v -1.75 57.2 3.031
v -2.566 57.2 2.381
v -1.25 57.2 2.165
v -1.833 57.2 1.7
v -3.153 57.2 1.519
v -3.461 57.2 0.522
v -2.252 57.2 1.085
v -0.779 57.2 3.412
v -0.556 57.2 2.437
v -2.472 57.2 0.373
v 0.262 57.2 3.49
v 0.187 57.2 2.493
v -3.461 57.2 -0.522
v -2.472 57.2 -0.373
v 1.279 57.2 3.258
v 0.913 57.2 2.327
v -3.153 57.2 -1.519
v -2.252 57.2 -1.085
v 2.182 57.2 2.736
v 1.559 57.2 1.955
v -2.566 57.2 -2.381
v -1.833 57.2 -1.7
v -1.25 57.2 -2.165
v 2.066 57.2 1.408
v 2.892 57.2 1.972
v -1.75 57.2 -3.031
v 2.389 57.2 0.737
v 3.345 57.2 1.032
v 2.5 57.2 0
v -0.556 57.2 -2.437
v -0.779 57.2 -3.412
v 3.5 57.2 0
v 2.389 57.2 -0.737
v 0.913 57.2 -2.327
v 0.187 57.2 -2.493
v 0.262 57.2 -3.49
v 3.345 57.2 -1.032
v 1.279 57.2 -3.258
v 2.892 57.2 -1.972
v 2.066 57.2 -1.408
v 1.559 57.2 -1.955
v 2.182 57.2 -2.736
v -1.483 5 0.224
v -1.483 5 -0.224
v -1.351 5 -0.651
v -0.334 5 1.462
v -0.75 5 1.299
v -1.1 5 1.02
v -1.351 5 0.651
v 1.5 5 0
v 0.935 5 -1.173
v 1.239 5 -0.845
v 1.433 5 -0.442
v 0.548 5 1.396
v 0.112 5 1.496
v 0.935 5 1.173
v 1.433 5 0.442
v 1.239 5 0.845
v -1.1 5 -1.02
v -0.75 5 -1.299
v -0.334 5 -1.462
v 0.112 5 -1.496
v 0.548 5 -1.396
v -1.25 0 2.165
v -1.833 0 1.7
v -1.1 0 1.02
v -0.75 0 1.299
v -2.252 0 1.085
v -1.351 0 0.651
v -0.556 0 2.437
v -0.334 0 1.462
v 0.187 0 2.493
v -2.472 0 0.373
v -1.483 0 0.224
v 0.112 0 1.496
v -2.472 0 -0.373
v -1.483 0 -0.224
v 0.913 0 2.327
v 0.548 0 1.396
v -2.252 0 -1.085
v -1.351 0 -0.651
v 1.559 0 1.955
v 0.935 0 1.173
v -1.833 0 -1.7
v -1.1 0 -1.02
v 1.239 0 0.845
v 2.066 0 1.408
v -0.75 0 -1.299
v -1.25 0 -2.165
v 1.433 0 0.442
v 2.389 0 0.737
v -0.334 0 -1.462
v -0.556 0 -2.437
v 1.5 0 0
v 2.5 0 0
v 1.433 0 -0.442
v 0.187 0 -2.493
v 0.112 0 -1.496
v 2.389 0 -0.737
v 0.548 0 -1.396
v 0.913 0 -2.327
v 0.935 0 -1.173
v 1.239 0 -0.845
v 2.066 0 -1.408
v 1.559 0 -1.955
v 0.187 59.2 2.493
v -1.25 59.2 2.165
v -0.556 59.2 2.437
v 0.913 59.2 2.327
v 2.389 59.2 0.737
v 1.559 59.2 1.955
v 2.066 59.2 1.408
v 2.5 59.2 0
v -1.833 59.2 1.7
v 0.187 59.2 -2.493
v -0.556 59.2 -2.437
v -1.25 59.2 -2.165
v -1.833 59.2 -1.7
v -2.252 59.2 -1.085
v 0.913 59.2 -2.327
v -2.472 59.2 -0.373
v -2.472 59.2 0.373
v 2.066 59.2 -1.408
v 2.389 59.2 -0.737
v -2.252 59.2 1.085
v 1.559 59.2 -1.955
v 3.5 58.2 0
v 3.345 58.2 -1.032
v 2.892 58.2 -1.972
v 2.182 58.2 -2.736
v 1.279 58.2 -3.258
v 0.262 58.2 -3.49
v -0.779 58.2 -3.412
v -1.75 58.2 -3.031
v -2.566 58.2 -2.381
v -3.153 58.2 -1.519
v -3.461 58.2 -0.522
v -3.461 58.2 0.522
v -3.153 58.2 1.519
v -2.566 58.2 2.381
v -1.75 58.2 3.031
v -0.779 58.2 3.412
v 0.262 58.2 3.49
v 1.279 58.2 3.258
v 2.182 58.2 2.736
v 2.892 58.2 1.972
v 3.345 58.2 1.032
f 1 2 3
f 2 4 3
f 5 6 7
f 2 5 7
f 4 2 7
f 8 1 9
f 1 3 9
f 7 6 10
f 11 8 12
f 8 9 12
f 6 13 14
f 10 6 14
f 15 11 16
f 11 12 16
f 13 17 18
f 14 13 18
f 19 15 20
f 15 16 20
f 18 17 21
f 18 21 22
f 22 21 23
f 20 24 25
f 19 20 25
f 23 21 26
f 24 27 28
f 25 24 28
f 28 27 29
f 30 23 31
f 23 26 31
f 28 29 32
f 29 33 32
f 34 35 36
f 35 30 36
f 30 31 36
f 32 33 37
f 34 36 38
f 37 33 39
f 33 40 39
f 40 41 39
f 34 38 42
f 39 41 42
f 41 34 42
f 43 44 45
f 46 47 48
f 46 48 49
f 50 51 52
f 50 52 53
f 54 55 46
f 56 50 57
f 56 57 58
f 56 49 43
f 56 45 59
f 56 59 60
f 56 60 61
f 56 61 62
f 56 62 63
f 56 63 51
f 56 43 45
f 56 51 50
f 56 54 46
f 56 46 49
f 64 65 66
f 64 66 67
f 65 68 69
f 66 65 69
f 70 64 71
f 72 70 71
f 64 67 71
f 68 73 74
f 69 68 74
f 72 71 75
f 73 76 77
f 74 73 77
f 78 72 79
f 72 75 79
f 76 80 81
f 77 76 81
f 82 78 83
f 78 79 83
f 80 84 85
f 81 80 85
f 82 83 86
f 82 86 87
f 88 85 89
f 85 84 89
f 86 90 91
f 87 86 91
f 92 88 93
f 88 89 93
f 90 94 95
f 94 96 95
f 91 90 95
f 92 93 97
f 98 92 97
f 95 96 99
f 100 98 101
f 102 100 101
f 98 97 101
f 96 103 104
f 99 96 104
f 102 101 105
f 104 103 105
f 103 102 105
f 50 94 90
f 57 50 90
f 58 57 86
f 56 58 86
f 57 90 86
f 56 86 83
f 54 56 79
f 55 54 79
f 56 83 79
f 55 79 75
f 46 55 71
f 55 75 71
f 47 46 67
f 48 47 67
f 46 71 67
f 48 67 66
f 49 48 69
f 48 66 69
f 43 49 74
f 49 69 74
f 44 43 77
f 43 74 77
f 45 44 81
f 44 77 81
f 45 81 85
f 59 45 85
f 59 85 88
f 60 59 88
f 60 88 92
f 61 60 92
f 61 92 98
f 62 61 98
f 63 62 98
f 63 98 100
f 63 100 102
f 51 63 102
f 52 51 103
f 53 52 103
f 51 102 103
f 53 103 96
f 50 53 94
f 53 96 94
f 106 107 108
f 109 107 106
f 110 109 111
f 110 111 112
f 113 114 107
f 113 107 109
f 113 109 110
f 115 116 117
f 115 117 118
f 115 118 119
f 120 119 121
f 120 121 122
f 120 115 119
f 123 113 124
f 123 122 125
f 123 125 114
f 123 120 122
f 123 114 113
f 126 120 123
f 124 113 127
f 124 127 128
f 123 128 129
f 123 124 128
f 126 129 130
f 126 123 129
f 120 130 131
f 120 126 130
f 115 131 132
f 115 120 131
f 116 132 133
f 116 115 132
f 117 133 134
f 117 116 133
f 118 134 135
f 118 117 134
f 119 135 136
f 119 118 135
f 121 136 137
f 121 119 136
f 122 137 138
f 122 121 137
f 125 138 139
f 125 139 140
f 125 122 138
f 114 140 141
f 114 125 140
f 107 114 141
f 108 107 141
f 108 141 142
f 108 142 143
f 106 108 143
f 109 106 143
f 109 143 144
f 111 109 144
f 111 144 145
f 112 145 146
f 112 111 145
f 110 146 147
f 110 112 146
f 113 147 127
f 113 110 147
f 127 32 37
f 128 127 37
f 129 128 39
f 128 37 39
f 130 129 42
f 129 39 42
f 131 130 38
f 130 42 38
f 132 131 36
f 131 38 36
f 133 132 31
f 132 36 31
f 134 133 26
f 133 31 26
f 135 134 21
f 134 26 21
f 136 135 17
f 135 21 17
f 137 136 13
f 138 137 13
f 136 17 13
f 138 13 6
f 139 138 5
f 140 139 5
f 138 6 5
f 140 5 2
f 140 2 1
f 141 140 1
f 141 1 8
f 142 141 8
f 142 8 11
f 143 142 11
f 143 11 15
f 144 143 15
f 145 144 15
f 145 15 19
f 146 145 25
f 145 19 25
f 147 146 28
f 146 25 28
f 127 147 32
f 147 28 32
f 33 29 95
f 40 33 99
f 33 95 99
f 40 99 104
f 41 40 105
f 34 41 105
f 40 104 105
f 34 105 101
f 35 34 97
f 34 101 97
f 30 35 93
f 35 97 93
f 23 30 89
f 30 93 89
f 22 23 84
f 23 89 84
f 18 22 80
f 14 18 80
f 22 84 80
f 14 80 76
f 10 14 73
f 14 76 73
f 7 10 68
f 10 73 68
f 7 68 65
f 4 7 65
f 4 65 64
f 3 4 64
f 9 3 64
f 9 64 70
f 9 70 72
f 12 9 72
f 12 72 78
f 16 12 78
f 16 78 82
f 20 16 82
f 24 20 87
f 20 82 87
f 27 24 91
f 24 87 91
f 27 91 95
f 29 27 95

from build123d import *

# Parameters (mm, degrees)
SKETCH1_R           = 2.5
BOSS_EXTRUDE1_DEPTH = 57.2
SKETCH2_R           = 3.5
BOSS_EXTRUDE2_DEPTH = 2
CHAMFER1_SIZE       = 1
SKETCH3_R           = 1.5
CUT_EXTRUDE1_DEPTH  = 5


with BuildPart() as part:
    # Sketch1 → Boss-Extrude1 (new body)
    with BuildSketch(Plane(origin=(0, 0, 0), x_dir=(1, 0, 0), z_dir=(0, 1, 0))):
        Circle(SKETCH1_R)
    extrude(amount=BOSS_EXTRUDE1_DEPTH)

    # Sketch2 → Boss-Extrude2 (add)
    with BuildSketch(Plane(origin=(0, 57.2, 0), x_dir=(1, 0, 0), z_dir=(0, 1, 0))):
        Circle(SKETCH2_R)
    extrude(amount=BOSS_EXTRUDE2_DEPTH)

    # Chamfer1
    chamfer1_edges = [part.edges().sort_by_distance(p)[0] for p in [
        (-3.5, 59.2, 0),
    ]]
    chamfer(chamfer1_edges, length=CHAMFER1_SIZE)

    # Sketch3 → Cut-Extrude1 (cut)
    with BuildSketch(Plane.XZ):
        Circle(SKETCH3_R)
    extrude(amount=-CUT_EXTRUDE1_DEPTH, mode=Mode.SUBTRACT)


solid = part.part
